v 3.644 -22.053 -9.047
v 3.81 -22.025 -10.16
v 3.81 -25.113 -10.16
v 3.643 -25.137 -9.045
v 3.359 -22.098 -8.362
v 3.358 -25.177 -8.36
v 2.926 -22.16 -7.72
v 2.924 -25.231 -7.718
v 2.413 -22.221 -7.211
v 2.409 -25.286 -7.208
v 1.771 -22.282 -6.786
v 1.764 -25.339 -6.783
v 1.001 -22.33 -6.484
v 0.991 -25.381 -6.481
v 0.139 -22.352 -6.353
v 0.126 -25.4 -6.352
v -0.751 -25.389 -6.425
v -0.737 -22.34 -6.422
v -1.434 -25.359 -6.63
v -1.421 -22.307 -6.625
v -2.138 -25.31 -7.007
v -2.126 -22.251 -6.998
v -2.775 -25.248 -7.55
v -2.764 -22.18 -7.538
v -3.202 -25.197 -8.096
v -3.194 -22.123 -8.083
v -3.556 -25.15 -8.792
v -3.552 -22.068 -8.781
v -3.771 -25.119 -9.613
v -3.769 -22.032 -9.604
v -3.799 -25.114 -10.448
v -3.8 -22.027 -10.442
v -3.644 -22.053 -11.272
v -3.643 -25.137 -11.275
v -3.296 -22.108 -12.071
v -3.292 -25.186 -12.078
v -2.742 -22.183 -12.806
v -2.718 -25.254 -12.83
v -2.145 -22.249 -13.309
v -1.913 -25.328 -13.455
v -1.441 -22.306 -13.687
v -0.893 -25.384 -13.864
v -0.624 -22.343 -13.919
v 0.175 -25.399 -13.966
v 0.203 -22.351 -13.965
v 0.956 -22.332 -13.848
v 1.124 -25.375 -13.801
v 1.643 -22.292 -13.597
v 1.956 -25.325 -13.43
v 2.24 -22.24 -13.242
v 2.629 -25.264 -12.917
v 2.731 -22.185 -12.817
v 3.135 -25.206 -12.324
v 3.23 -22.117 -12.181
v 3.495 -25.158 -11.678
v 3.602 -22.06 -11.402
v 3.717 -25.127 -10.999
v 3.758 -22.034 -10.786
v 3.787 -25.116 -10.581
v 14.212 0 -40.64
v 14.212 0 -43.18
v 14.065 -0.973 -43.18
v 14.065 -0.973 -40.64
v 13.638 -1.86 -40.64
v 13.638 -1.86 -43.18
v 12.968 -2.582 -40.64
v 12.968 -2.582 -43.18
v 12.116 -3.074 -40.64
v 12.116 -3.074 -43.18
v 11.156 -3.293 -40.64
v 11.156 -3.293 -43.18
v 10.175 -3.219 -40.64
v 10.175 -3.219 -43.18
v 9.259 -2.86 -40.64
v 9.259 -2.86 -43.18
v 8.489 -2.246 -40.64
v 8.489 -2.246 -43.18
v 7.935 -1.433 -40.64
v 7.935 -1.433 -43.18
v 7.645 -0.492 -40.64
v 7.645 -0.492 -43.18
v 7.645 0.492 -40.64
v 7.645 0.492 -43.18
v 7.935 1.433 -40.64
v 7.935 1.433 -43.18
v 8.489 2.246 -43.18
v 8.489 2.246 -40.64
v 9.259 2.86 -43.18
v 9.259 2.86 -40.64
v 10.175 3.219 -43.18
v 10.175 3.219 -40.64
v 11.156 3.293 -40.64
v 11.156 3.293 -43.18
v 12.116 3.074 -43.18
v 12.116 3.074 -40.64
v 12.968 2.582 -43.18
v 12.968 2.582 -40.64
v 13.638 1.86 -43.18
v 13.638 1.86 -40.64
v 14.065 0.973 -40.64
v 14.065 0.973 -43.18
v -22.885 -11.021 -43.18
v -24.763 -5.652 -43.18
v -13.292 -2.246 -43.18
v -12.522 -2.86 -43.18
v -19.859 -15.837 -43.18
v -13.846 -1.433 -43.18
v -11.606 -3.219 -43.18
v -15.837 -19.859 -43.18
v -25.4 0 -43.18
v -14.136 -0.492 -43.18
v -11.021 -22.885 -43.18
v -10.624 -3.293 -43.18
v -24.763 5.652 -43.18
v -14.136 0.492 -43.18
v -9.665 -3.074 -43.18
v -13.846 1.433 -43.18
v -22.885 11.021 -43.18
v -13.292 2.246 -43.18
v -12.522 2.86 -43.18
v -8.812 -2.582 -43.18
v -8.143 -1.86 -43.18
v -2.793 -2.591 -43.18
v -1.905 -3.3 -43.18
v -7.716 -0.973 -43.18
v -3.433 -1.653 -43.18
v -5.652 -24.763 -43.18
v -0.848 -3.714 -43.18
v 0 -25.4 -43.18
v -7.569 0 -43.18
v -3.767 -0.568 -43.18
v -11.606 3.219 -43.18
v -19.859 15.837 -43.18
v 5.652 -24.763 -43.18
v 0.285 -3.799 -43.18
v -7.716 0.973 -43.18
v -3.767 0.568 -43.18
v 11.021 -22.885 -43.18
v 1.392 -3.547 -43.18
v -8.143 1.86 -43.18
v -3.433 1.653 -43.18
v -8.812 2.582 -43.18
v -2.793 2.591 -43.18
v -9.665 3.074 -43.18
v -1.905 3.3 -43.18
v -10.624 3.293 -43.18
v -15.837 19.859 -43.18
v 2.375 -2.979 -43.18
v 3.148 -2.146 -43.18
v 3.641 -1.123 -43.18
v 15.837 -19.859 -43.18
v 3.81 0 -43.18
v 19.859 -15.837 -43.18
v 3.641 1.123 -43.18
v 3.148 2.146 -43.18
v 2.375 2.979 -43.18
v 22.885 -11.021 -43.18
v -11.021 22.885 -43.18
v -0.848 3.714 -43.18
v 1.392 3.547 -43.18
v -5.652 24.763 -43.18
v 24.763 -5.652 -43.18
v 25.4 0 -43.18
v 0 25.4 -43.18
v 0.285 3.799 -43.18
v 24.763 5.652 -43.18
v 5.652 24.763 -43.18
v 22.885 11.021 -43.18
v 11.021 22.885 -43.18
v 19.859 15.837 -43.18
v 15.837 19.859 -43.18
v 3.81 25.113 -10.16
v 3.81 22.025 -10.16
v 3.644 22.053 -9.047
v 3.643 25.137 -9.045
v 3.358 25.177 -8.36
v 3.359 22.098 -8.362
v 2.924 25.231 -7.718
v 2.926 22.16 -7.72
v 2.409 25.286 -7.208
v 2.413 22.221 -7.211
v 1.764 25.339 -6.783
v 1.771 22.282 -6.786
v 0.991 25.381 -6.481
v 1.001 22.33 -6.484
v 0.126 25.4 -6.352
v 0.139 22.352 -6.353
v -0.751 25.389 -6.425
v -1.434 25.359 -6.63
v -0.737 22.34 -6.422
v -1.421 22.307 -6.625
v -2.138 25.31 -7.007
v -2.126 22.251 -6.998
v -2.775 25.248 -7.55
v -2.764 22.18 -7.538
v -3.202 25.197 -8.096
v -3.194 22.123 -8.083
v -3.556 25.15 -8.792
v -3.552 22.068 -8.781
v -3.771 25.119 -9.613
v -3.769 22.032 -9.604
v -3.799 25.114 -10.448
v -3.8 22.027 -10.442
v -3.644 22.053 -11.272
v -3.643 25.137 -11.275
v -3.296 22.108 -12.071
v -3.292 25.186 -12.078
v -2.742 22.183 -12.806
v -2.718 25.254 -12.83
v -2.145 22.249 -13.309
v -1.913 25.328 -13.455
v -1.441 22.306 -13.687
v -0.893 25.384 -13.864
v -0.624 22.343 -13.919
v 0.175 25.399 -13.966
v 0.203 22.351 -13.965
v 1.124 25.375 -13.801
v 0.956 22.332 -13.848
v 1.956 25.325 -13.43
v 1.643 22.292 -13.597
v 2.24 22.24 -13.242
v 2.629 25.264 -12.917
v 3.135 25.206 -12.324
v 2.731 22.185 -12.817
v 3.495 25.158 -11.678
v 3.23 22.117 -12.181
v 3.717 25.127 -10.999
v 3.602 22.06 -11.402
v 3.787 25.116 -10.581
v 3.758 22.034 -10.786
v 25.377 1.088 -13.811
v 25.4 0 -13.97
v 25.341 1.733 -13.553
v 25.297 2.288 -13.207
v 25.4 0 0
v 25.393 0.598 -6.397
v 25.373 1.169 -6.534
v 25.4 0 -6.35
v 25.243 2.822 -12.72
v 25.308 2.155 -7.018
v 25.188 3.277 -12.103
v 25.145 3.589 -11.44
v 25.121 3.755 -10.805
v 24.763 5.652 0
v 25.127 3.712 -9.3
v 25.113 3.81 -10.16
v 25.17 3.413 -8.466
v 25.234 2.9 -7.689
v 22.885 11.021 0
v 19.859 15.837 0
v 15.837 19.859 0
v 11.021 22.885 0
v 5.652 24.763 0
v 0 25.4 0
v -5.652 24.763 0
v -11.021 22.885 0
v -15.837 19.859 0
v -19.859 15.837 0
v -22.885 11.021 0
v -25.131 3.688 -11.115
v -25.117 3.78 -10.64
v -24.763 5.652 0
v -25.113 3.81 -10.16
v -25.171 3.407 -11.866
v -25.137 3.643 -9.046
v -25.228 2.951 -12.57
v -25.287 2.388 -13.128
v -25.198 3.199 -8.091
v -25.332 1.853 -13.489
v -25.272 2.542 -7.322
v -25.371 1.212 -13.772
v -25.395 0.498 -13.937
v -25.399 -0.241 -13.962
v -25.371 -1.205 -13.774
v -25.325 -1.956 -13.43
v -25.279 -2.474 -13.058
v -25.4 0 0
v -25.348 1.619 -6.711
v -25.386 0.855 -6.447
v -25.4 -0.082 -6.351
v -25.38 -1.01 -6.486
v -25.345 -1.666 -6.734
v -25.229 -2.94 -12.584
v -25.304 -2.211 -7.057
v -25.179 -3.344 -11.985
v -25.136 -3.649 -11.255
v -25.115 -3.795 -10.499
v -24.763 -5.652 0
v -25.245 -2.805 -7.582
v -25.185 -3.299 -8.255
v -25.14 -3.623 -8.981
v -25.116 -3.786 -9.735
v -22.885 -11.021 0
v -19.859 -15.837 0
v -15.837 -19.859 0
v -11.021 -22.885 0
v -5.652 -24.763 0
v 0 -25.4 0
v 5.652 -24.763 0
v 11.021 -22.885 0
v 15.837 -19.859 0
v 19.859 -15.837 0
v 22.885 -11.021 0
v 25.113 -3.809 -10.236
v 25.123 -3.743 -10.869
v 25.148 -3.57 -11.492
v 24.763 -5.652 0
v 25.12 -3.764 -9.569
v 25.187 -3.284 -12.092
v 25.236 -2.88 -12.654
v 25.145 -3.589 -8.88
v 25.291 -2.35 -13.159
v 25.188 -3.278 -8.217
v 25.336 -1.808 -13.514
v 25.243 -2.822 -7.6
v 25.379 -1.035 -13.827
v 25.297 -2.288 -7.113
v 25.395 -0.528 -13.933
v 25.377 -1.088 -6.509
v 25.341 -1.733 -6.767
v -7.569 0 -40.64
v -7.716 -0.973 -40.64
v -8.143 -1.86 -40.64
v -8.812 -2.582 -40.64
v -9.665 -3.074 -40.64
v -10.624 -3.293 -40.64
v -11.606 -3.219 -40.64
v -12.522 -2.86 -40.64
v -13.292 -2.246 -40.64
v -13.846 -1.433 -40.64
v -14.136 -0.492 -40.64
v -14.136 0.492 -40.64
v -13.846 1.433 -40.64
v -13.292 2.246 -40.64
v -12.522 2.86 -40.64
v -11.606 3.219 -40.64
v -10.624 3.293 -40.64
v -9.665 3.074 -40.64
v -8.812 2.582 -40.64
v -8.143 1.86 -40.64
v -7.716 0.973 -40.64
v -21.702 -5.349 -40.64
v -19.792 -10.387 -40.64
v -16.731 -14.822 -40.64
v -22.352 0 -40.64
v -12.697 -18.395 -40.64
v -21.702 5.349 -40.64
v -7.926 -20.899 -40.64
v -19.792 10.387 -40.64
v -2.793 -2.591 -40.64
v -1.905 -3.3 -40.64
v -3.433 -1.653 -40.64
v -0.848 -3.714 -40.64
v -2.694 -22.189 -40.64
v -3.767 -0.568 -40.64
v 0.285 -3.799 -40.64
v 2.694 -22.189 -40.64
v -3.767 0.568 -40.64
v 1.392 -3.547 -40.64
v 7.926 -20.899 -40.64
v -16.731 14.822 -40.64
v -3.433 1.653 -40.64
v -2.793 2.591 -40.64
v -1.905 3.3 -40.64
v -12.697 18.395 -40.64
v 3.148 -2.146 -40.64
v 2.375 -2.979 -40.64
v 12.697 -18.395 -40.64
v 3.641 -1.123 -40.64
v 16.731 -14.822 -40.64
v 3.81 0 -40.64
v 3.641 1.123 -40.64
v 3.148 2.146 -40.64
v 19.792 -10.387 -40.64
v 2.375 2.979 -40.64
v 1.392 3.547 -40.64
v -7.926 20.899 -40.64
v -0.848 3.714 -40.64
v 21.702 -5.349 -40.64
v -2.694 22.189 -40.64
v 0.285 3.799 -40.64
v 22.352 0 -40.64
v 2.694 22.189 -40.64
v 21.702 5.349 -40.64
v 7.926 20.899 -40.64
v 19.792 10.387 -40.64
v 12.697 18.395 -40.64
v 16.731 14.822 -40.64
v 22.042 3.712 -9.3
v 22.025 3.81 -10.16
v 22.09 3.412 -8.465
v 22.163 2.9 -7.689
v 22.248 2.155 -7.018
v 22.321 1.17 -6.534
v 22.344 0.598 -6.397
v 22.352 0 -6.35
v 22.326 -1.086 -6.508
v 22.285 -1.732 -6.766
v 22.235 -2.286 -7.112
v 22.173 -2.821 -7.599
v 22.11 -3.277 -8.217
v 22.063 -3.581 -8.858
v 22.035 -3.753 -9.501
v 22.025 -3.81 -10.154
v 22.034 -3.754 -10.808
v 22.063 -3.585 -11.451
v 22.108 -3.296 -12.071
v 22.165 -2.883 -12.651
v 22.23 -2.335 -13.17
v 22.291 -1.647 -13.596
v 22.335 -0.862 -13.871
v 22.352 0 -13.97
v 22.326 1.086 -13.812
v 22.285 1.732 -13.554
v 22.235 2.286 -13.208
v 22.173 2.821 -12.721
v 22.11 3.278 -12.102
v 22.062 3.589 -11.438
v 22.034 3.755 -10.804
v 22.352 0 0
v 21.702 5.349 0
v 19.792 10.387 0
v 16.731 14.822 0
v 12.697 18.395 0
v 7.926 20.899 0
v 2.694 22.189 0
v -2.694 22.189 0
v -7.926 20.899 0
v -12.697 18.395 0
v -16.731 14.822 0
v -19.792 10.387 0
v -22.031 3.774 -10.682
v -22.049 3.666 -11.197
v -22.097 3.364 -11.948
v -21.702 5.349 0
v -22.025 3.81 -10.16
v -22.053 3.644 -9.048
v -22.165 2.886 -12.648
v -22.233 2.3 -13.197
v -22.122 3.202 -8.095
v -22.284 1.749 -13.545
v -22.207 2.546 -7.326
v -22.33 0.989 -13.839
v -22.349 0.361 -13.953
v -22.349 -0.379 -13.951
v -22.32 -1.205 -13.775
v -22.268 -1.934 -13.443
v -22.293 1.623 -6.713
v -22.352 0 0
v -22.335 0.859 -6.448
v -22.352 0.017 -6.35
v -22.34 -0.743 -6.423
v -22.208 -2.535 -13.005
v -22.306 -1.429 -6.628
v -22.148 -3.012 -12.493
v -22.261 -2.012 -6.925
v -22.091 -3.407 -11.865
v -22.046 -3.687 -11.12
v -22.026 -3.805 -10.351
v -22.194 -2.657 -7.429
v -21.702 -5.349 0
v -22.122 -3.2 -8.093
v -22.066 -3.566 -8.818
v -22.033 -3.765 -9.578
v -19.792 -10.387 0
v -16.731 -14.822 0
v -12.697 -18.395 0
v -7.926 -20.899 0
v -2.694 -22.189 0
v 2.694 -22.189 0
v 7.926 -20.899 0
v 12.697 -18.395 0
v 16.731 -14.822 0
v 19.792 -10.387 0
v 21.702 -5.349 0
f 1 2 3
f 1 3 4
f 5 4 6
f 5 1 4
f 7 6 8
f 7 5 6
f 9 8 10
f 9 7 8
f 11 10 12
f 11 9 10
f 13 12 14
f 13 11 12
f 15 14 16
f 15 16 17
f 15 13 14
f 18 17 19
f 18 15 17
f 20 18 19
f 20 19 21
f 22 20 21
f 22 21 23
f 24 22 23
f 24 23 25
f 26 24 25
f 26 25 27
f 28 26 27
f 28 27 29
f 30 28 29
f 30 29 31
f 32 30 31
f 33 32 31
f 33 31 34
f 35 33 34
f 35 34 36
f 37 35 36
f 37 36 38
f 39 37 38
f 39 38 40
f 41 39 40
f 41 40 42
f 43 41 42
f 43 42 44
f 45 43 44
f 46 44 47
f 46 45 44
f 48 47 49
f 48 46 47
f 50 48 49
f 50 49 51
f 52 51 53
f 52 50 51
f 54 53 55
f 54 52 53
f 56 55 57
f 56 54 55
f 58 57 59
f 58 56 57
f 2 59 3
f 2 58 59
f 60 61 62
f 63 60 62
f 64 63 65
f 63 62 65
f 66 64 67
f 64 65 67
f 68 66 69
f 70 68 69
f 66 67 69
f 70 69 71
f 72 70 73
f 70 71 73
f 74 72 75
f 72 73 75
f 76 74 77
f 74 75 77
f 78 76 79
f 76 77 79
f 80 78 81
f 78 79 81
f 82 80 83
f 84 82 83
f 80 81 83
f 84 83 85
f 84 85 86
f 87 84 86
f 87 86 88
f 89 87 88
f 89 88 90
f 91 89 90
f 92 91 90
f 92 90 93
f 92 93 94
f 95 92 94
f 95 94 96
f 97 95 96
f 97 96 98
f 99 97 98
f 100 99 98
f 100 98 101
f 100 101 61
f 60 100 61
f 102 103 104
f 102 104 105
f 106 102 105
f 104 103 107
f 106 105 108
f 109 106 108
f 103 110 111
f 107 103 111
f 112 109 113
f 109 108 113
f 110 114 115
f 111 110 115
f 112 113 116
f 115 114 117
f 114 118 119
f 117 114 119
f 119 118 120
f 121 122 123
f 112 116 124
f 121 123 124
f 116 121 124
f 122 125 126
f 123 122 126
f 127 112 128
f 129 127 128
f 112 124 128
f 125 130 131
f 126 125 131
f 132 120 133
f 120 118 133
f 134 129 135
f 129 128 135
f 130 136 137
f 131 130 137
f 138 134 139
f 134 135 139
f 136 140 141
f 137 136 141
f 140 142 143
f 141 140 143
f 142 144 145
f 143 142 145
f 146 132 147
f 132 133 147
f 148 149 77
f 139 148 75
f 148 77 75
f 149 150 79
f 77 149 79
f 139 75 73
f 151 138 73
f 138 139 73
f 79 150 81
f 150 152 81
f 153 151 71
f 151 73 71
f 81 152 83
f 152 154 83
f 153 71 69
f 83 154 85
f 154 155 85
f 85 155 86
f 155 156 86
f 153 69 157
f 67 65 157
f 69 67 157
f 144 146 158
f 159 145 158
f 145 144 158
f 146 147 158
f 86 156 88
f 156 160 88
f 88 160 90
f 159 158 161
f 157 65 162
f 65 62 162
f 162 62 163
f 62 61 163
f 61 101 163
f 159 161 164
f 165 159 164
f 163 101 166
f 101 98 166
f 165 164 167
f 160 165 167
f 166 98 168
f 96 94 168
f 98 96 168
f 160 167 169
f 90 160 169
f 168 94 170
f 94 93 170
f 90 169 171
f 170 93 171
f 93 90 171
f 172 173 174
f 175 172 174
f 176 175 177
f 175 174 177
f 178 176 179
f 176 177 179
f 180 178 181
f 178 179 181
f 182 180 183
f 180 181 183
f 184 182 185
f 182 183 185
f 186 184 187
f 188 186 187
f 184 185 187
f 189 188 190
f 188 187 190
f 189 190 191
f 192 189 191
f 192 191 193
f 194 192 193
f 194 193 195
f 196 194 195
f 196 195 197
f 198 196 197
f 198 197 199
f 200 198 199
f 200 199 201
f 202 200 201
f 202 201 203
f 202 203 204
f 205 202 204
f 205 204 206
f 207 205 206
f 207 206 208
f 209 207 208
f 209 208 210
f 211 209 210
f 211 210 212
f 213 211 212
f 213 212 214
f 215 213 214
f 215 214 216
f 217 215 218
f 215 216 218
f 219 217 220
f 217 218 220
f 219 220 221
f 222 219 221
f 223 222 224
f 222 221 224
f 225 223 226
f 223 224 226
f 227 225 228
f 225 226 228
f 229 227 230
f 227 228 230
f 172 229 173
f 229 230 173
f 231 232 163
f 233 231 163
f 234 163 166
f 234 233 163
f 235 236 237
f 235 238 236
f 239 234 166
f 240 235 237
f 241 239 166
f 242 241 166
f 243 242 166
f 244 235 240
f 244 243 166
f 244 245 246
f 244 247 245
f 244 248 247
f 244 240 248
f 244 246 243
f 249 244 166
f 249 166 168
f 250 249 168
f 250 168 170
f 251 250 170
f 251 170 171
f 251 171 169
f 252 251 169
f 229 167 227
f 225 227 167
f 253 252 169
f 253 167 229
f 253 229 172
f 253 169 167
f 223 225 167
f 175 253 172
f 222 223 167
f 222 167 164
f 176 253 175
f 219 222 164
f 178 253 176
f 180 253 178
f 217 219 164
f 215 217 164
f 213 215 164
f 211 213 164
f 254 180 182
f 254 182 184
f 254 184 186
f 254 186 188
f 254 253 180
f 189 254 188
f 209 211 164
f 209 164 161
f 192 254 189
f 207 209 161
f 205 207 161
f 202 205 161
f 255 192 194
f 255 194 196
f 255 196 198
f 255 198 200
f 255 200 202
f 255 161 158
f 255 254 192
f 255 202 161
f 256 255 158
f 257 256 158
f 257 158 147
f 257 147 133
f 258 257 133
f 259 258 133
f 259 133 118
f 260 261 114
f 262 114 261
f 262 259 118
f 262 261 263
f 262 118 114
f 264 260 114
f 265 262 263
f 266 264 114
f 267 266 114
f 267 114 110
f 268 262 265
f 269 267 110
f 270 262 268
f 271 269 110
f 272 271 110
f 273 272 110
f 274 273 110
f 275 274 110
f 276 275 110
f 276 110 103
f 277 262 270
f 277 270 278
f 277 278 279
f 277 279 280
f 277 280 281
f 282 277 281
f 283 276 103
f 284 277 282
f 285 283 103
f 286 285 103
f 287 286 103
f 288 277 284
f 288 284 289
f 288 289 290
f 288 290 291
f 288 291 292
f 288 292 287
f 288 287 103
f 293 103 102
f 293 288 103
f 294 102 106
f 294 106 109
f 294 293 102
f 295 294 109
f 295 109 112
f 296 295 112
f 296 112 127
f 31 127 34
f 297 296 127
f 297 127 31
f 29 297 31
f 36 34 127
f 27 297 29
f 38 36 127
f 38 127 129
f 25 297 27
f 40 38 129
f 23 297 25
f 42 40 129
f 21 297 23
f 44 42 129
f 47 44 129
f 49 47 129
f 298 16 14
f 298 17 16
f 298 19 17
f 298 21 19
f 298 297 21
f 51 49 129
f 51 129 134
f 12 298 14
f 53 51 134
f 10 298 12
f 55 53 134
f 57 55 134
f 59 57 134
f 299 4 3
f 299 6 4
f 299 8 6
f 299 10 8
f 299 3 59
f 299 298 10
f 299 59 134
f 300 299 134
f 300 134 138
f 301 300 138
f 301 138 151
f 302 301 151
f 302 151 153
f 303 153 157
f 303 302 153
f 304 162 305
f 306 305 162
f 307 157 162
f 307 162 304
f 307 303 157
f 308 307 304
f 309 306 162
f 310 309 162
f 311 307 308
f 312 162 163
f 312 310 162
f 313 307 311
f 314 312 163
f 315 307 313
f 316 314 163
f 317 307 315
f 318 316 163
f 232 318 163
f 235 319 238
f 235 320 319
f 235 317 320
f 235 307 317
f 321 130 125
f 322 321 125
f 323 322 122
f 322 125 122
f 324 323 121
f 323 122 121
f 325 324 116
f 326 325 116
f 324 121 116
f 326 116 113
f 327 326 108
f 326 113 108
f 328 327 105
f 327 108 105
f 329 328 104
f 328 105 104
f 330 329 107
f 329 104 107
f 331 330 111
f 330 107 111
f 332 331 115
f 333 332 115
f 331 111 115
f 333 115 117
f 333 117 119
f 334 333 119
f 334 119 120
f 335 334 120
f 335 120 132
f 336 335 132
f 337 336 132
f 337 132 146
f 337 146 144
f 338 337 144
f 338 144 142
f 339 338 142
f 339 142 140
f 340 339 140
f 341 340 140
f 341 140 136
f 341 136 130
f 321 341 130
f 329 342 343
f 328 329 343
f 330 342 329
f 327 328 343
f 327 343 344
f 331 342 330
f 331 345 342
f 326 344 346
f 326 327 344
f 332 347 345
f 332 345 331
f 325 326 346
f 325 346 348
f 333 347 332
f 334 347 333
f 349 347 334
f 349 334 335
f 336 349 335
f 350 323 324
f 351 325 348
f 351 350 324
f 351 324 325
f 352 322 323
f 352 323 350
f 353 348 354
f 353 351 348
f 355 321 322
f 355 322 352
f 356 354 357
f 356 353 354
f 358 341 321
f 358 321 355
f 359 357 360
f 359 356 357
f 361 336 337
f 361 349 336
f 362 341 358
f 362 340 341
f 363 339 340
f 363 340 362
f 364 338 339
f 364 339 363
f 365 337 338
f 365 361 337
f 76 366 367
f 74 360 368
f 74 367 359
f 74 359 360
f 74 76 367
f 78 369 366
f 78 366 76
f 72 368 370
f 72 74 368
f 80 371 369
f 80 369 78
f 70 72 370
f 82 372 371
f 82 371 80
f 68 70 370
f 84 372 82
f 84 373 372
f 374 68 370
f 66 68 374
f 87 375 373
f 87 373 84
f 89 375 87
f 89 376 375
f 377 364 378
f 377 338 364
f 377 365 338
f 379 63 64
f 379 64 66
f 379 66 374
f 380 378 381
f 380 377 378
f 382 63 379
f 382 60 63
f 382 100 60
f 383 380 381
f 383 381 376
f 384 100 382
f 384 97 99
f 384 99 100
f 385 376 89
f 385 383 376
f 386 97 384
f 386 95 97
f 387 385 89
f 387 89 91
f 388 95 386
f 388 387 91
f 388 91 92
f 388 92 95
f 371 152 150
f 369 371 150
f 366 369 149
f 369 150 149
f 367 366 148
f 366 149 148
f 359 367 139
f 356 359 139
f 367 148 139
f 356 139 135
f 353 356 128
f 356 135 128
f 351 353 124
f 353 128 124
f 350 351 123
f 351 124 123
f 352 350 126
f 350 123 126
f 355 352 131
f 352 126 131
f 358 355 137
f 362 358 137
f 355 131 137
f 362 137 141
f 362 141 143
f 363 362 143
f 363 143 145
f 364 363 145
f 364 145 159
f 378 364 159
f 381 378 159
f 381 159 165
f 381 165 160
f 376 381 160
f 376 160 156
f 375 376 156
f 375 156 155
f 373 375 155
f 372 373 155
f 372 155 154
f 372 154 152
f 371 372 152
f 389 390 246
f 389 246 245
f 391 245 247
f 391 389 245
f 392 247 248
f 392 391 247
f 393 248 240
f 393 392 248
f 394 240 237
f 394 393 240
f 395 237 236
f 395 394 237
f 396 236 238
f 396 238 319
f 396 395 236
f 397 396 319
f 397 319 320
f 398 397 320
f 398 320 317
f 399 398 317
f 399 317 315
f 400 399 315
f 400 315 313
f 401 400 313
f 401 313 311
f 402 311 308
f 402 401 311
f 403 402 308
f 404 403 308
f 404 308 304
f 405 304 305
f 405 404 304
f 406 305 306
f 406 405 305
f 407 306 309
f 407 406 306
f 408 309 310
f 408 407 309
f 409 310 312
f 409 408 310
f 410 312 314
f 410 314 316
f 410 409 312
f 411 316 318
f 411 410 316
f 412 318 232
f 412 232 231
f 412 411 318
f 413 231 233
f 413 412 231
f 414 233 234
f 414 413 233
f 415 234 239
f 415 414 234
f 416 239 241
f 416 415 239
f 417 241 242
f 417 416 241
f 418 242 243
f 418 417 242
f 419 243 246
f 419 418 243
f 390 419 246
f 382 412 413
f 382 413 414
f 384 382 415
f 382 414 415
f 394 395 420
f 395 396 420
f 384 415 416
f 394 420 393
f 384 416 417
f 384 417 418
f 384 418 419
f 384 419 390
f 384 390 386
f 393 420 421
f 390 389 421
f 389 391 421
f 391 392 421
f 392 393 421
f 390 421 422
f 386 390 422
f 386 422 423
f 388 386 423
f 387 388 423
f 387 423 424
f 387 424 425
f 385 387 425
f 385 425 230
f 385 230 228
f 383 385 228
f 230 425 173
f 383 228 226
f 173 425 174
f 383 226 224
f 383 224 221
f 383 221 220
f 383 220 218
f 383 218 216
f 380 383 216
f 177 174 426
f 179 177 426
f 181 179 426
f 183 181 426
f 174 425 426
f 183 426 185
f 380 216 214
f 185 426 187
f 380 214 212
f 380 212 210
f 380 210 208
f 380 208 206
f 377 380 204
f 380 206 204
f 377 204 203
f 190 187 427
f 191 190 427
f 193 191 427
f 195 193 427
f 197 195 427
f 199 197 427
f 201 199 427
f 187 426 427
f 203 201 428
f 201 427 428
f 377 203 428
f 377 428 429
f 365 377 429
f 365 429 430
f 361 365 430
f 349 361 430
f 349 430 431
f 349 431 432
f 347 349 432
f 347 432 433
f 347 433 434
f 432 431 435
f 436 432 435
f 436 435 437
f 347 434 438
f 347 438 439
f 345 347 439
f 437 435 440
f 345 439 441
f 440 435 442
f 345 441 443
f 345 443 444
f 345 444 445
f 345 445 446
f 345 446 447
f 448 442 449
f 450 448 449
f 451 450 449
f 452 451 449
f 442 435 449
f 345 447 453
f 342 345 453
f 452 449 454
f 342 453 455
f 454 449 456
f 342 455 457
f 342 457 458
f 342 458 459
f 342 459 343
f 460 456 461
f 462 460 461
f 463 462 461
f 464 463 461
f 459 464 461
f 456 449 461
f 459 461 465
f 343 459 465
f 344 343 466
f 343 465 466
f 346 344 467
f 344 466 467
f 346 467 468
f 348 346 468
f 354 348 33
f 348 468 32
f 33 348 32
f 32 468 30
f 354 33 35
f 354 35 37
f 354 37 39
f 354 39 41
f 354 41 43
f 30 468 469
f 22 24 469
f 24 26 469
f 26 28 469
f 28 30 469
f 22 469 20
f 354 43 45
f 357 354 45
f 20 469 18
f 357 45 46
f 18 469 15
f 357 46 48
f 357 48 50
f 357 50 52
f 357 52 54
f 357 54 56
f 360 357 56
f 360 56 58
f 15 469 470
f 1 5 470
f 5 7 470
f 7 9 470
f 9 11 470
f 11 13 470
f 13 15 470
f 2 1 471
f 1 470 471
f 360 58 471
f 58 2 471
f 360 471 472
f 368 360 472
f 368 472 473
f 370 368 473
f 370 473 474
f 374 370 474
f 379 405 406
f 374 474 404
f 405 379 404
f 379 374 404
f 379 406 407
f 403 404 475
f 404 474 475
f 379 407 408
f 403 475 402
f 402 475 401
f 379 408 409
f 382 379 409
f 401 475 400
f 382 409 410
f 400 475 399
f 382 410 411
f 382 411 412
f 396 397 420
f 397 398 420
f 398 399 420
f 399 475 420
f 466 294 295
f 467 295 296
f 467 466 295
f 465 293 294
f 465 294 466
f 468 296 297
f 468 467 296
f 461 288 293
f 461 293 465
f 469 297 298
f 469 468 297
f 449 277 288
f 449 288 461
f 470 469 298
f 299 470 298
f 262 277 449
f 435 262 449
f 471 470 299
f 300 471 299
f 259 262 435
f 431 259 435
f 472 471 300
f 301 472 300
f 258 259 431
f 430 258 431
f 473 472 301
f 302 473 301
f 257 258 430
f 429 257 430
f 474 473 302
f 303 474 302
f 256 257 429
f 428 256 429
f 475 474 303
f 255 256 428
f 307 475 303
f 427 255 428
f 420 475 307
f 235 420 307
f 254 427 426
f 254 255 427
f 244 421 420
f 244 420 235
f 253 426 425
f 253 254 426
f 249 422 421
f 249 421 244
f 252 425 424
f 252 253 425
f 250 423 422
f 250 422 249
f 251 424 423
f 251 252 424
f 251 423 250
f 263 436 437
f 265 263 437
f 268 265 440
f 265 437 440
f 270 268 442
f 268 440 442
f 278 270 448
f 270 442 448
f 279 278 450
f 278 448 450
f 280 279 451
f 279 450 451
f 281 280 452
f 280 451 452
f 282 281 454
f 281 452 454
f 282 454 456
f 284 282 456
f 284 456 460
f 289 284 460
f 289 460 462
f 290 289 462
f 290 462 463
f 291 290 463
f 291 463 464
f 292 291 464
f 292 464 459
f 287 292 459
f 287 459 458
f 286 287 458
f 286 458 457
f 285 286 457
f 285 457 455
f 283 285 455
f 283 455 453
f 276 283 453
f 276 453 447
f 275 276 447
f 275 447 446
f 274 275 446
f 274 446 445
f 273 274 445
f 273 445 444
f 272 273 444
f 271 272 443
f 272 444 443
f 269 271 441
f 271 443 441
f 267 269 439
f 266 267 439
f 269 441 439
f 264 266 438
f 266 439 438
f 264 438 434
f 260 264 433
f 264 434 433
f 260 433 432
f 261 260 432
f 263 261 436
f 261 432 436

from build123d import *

# Parameters (mm, degrees)
F0_R          = 25.4
F1_DEPTH      = 43.18
F2_R          = 3.81
F3_DEPTH      = 43.181
F4_R          = 3.81
F5_DEPTH      = 25.401
F5_DEPTH_BACK = 25.401
F6_R          = 3.81
F7_DEPTH      = 25.4010001
F7_DEPTH_BACK = 25.4010001
F8_R          = 3.302
F9_DEPTH      = 43.1810001
F10_R         = 22.352
F11_DEPTH     = 40.64


with BuildPart() as f1:
    # F0 (on Top) → F1 (new body)
    with BuildSketch(Plane.XY):
        Circle(F0_R)
    extrude(amount=-F1_DEPTH)

    # F2 (on face) → F3 (cut, through all)
    with BuildSketch(Plane(origin=(0, 0, -43.18), x_dir=(1, 0, 0), z_dir=(0, 0, -1))):
        Circle(F2_R)
    extrude(amount=-F3_DEPTH, mode=Mode.SUBTRACT)

    # F4 (on Right) → F5 (cut, two sides)
    with BuildSketch(Plane.YZ) as f5_sk:
        with Locations((0, -10.16)):
            Circle(F4_R)
    extrude(amount=-F5_DEPTH, mode=Mode.SUBTRACT)
    extrude(f5_sk.sketch, amount=F5_DEPTH_BACK, mode=Mode.SUBTRACT)

    # F6 (on Front) → F7 (cut, two sides)
    with BuildSketch(Plane.XZ) as f7_sk:
        with Locations((0, -10.16)):
            Circle(F6_R)
    extrude(amount=-F7_DEPTH, mode=Mode.SUBTRACT)
    extrude(f7_sk.sketch, amount=F7_DEPTH_BACK, mode=Mode.SUBTRACT)

    # F8 (on face) → F9 (cut, through all)
    with BuildSketch(Plane(origin=(0, 0, -43.18), x_dir=(1, 0, 0), z_dir=(0, 0, -1))):
        with Locations((10.9096324106, 0)):
            Circle(F8_R)
        with Locations((-10.8710342307, 0)):
            Circle(F8_R)
    extrude(amount=-F9_DEPTH, mode=Mode.SUBTRACT)

    # F10 (on face) → F11 (cut)
    with BuildSketch(Plane.XY):
        Circle(F10_R)
    extrude(amount=-F11_DEPTH, mode=Mode.SUBTRACT)


solid = f1.part
